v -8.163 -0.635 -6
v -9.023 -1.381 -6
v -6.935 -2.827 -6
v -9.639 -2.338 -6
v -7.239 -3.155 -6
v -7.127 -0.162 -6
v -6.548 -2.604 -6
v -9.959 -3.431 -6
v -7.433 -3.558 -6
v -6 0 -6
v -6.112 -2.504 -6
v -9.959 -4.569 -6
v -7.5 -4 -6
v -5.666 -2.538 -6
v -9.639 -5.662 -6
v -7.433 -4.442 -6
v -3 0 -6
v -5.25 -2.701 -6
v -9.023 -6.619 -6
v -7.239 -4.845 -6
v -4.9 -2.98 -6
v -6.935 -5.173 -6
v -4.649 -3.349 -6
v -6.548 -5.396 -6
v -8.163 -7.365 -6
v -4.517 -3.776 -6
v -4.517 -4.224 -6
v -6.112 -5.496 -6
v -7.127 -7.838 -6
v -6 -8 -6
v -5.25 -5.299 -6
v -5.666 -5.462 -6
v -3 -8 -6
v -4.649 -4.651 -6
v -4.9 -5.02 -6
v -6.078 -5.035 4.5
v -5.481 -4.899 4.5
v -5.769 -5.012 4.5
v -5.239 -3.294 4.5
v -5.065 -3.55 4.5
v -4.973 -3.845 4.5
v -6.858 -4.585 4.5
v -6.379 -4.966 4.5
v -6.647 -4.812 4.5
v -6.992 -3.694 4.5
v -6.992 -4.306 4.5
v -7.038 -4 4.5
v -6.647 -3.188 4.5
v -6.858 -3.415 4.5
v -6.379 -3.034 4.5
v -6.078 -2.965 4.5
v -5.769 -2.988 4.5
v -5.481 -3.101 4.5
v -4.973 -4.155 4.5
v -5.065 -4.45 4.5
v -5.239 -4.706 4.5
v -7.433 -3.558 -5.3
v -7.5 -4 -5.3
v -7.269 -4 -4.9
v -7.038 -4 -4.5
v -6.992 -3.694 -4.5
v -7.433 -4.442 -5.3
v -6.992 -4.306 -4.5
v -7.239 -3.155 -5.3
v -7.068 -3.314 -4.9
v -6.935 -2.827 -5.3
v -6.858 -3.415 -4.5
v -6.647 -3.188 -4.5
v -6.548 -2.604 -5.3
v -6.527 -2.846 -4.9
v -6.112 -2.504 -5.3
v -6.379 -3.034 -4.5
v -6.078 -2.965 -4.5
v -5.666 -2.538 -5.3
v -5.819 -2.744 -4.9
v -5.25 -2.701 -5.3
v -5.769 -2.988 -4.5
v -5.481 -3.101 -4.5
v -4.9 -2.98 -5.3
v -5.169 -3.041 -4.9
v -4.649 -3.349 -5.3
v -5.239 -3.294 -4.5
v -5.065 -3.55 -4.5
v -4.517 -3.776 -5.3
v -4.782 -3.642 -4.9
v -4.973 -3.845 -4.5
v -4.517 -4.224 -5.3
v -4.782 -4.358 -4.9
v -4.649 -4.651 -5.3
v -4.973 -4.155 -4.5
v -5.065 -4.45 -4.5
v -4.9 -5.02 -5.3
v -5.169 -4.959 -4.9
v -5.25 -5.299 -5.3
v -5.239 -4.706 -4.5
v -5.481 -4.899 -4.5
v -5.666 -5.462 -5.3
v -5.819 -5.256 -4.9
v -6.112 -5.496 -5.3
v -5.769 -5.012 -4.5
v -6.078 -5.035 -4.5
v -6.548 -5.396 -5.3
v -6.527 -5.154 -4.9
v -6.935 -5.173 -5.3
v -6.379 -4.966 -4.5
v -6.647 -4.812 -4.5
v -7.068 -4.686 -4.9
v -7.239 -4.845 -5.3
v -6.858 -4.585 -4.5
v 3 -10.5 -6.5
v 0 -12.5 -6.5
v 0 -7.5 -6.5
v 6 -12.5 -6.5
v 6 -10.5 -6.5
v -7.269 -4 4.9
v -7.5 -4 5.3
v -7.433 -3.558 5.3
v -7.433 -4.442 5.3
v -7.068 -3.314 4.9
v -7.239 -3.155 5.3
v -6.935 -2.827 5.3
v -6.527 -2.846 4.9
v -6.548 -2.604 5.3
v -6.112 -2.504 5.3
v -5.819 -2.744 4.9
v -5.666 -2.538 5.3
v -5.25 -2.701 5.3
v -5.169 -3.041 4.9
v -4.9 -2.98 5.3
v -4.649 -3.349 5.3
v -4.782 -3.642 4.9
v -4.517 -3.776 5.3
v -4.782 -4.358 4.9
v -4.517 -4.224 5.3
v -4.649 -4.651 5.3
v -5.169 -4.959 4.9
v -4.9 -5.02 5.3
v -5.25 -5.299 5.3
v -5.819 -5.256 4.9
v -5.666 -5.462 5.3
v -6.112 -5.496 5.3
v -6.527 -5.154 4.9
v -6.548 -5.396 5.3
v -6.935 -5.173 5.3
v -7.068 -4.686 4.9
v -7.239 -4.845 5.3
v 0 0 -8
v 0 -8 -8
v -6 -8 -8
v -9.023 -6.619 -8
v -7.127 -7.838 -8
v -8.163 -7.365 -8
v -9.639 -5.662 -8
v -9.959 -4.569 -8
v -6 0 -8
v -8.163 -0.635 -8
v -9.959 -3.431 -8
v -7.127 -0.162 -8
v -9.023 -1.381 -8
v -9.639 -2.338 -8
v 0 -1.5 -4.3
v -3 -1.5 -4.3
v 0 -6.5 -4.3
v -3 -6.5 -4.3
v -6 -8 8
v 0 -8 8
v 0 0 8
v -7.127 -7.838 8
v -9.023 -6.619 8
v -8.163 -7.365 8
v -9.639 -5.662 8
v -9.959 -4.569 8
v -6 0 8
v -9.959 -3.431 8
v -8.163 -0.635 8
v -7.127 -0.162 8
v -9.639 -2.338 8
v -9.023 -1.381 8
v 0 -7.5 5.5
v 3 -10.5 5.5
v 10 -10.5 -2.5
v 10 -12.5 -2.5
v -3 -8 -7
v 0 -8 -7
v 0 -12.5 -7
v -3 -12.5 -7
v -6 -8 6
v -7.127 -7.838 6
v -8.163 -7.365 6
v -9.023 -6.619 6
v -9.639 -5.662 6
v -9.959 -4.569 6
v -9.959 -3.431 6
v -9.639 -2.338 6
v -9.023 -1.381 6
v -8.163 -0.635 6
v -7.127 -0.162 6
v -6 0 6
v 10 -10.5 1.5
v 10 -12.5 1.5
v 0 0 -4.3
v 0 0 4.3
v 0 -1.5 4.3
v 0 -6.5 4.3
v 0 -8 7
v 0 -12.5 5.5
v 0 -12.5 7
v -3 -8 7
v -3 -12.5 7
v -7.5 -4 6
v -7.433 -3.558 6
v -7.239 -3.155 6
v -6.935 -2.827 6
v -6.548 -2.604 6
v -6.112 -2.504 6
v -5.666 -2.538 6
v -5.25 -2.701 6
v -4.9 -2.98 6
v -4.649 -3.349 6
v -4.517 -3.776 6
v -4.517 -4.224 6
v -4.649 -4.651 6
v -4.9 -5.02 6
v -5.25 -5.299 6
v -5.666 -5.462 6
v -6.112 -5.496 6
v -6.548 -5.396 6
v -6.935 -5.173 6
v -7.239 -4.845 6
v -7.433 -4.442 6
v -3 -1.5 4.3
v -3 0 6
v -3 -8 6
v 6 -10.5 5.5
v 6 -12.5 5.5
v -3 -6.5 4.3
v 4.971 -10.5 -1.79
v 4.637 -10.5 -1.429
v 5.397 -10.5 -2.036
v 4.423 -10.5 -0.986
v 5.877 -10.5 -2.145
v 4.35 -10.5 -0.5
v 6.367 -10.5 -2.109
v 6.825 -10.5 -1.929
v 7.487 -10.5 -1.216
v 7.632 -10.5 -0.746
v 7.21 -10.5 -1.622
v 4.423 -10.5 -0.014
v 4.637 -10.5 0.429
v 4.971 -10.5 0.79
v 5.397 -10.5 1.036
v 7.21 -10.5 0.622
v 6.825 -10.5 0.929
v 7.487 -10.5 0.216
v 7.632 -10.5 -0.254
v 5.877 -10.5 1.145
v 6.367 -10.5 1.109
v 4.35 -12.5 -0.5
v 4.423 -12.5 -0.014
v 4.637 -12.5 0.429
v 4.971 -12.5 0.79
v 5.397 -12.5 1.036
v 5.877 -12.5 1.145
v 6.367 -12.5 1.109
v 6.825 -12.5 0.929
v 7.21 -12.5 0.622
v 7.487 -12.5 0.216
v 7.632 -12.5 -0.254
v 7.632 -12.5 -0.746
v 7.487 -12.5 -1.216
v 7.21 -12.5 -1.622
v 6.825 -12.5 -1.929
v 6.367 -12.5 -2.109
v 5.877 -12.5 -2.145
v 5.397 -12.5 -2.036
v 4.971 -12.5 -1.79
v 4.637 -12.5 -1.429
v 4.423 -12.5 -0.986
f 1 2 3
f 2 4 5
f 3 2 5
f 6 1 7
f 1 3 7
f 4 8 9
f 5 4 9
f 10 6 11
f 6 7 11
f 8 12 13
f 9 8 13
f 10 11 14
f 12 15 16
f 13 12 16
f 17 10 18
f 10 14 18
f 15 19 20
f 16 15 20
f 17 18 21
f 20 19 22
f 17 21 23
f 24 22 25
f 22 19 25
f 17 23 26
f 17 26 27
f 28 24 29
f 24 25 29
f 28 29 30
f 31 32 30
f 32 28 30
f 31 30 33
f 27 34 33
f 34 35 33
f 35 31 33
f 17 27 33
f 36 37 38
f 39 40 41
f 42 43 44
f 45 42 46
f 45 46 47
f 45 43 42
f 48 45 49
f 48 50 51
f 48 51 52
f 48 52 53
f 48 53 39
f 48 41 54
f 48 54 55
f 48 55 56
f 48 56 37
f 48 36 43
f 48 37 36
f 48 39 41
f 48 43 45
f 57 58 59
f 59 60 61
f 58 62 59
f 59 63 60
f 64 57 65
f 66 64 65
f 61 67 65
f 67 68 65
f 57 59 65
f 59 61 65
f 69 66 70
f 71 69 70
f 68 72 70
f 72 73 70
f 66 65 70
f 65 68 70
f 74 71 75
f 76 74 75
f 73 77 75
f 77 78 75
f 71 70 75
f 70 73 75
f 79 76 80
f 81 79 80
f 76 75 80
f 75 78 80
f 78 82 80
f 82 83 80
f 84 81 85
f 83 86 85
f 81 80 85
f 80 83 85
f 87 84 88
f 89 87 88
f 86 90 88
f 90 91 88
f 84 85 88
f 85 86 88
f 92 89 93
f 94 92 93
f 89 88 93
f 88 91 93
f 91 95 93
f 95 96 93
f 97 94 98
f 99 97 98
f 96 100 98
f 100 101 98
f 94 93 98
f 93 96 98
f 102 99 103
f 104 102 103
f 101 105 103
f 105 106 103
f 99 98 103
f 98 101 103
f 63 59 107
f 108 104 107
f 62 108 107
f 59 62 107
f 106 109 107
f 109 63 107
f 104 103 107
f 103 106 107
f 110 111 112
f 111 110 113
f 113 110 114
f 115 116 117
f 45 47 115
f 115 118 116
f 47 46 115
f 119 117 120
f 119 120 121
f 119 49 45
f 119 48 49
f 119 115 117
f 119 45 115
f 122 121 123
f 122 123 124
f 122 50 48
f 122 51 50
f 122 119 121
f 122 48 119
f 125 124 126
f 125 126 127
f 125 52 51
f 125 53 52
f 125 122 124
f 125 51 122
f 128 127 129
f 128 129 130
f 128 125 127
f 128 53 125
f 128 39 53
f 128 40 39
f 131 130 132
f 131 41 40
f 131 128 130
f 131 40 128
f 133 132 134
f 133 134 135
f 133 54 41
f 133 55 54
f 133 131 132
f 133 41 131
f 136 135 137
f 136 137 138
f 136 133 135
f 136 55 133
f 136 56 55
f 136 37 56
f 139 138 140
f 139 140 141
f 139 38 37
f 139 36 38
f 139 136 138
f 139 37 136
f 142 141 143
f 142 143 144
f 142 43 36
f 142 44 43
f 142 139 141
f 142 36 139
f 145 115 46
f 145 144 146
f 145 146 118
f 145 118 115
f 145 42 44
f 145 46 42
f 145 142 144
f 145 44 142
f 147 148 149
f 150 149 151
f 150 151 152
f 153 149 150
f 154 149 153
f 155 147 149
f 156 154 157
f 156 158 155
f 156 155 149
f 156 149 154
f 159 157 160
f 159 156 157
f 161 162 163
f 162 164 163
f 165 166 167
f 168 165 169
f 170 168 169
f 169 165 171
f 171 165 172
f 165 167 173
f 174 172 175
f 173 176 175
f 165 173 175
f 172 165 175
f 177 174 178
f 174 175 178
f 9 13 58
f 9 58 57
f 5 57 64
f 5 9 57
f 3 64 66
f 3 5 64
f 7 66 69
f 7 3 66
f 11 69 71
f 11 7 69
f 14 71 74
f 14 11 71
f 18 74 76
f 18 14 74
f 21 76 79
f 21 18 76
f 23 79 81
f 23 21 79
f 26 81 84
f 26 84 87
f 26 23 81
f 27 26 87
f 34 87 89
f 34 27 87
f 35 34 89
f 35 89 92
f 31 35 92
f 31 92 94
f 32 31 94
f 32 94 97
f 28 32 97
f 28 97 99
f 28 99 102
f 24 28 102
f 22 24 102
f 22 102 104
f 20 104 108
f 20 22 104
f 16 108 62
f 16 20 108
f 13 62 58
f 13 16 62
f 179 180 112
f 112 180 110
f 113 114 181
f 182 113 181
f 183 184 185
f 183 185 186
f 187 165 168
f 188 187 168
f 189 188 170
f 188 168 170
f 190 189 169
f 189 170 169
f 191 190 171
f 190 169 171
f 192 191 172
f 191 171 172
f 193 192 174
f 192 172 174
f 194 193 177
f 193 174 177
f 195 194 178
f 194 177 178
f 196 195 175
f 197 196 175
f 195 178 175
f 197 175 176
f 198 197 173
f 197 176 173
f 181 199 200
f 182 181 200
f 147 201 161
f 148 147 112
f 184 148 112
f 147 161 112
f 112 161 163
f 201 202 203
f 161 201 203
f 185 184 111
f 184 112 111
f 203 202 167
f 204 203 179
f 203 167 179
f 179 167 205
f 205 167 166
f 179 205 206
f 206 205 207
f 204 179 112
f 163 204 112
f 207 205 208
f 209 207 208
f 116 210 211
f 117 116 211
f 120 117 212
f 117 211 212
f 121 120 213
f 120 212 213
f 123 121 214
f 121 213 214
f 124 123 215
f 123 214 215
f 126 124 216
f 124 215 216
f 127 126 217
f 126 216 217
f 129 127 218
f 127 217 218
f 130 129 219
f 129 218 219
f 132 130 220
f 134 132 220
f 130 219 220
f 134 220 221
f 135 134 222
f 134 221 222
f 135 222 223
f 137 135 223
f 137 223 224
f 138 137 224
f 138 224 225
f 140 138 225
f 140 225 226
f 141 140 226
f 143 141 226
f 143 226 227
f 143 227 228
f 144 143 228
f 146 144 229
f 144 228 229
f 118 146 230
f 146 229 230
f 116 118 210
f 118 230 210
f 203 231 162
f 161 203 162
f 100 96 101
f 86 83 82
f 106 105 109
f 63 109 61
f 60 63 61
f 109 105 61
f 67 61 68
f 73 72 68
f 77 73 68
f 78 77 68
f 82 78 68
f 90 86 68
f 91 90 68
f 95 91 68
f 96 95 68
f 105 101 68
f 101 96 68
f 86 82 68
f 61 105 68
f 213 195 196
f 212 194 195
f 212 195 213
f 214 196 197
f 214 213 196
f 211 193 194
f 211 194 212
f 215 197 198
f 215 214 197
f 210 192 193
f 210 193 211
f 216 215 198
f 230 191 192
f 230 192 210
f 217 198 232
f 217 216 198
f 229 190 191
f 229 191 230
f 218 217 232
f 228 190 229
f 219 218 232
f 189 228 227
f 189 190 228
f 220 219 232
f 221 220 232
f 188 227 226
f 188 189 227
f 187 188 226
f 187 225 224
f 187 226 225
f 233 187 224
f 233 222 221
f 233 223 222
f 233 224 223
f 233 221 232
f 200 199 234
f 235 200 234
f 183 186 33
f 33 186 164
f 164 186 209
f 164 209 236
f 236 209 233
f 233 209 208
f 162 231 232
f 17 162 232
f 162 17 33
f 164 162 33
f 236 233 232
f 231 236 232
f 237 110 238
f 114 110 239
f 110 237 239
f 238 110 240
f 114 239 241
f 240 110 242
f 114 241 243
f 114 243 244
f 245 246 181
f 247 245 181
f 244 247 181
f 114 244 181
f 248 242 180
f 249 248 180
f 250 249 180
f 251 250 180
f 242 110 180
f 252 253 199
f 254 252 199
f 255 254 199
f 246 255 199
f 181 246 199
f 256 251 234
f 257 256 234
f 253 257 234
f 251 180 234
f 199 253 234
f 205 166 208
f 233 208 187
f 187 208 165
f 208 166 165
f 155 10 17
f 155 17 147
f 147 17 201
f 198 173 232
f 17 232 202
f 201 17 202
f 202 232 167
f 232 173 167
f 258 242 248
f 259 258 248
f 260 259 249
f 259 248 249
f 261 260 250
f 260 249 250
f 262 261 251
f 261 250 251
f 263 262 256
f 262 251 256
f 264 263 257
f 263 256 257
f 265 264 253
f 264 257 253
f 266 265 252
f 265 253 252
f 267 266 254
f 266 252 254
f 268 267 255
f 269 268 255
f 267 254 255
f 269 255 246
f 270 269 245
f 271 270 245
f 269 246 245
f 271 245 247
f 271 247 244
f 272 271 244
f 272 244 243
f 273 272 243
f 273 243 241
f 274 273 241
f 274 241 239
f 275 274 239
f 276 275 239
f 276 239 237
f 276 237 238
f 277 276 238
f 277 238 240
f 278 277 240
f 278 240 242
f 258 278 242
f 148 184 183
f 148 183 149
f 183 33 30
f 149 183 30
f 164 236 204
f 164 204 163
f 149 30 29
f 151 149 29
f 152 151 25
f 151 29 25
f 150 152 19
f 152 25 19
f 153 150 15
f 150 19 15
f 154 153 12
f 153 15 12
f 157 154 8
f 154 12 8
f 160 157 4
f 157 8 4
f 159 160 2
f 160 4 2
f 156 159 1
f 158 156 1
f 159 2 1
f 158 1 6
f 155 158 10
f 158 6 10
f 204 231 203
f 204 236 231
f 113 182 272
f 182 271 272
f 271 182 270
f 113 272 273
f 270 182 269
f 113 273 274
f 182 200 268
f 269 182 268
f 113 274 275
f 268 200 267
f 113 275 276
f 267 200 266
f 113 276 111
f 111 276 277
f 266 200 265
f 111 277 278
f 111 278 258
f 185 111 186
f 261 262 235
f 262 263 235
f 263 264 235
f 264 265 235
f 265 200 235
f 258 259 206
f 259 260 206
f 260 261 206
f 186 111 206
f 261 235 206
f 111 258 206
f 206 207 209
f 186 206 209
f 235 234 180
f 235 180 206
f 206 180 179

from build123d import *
from OCP.BRepFilletAPI import BRepFilletAPI_MakeChamfer

# Parameters (mm, degrees)
RESSALTO_EXTRUS_O1_DEPTH    = 8
CORTE_EXTRUS_O1_START       = -8
CORTE_EXTRUS_O1_OUTLINE_W   = 7
CORTE_EXTRUS_O1_OUTLINE_H   = 12
CORTE_EXTRUS_O1_OUTLINE_W_2 = 6
CORTE_EXTRUS_O1_OUTLINE_H_2 = 8.6
CORTE_EXTRUS_O1_DEPTH       = 8
CORTE_EXTRUS_O2_DEPTH       = 16.099668871
CORTE_EXTRUS_O2_DEPTH_BACK  = 16.099668871
ESBO_O3_W                   = 8.6
ESBO_O3_H                   = 5
CORTE_EXTRUS_O3_DEPTH       = 18.756407294
CORTE_EXTRUS_O3_DEPTH_BACK  = 18.756407294
ESBO_O4_R                   = 1.65
ESBO_O5_R                   = 1.5
RESSALTO_EXTRUS_O2_DEPTH    = 1.5
FILETE1_R                   = 2
CHANFRO1_SIZE               = 0.8
CHANFRO1_SIZE2              = 0.461880215
ESBO_O7_W                   = 9.300626083
ESBO_O7_H                   = 16
CORTE_EXTRUS_O5_DEPTH       = 10
RESSALTO_EXTRUS_O4_DEPTH    = 7
ESBO_O10_R                  = 1.65
CORTE_EXTRUS_O6_DEPTH       = 18.895530168
CHANFRO2_SIZE               = 3


# Read off the part's stored shape, not the designer's step: Corte-extrusão1
with BuildPart() as part:
    # Esboço1 → Ressalto-extrusão1 (new, symmetric)
    with BuildSketch(Plane.XY):
        with BuildLine():
            Line((-6, 0), (6, 0))
            Line((6, 0), (6, -5.690598923))
            Line((6, -5.690598923), (2, -8))
            Line((2, -8), (-6, -8))
            ThreePointArc((-6, -8), (-10, -4), (-6, 0))
        make_face()
    extrude(amount=RESSALTO_EXTRUS_O1_DEPTH, both=True)

    # Corte-extrusão1 outline → Corte-extrusão1 (cut)
    with BuildSketch(Plane(origin=(0, 0, 0), x_dir=(1, 0, 0), z_dir=(0, 1, 0)).offset(CORTE_EXTRUS_O1_START)):
        with Locations((-6.5, 0)):
            Rectangle(CORTE_EXTRUS_O1_OUTLINE_W, CORTE_EXTRUS_O1_OUTLINE_H)
        with Locations((3, 0)):
            Rectangle(CORTE_EXTRUS_O1_OUTLINE_W_2, CORTE_EXTRUS_O1_OUTLINE_H_2)
    extrude(amount=CORTE_EXTRUS_O1_DEPTH, mode=Mode.SUBTRACT)

    # Esboço3 → Corte-extrusão2 (cut, two sides: drawn at the far end of the back side and taken through both)
    with BuildSketch(Plane(origin=(0, 0, 0), x_dir=(0, 0, -1), z_dir=(1, 0, 0)).offset(-CORTE_EXTRUS_O2_DEPTH_BACK)):
        with Locations((0, -4)):
            Rectangle(ESBO_O3_W, ESBO_O3_H)
    extrude(amount=CORTE_EXTRUS_O2_DEPTH + CORTE_EXTRUS_O2_DEPTH_BACK, mode=Mode.SUBTRACT)

    # Esboço4 → Corte-extrusão3 (cut, two sides: drawn at the far end of the back side and taken through both)
    with BuildSketch(Plane(origin=(0, 0, 4.3), x_dir=(-1, 0, 0), z_dir=(0, 0, -1)).offset(-CORTE_EXTRUS_O3_DEPTH_BACK)):
        with Locations((-3.2, -4)):
            Circle(ESBO_O4_R)
    extrude(amount=CORTE_EXTRUS_O3_DEPTH + CORTE_EXTRUS_O3_DEPTH_BACK, mode=Mode.SUBTRACT)

    # Esboço5 → Ressalto-extrusão2 (add)
    with BuildSketch(Plane(origin=(0, 0, 6), x_dir=(-1, 0, 0), z_dir=(0, 0, -1))):
        with Locations((6, -4)):
            Circle(ESBO_O5_R)
    ressalto_extrus_o2 = extrude(amount=RESSALTO_EXTRUS_O2_DEPTH)

    # Espelhar1: Ressalto-extrusão2 across plane
    add(ressalto_extrus_o2.mirror(Plane.XY))

    # Filete1
    filete1_edges = [part.edges().sort_by_distance(p)[0] for p in [
        (6, -5.690598923, -6.15),
        (6, -5.690598923, 6.15),
    ]]
    fillet(filete1_edges, radius=FILETE1_R)

    # Chanfro1: one chamfer whose edges measure the first distance from different faces: ONE call of the kernel's chamfer builder (chamfer() names one face for all edges)
    chanfro1_edges_1 = [part.edges().sort_by_distance(p)[0] for p in [
        (-4.5, -4, 4.5),
    ]]
    chanfro1_side_1 = [part.faces().sort_by_distance(p)[0] for p in [
        (-4.5, -4, 5.25),
    ]]
    chanfro1_edges_2 = [part.edges().sort_by_distance(p)[0] for p in [
        (-4.5, -4, -4.5),
    ]]
    chanfro1_side_2 = [part.faces().sort_by_distance(p)[0] for p in [
        (-4.5, -4, -5.25),
    ]]
    chanfro1_edges_3 = [part.edges().sort_by_distance(p)[0] for p in [
        (4.85, -4, -4.3),
    ]]
    chanfro1_side_3 = [part.faces().sort_by_distance(p)[0] for p in [
        (4.85, -4, -6.15),
    ]]
    chanfro1_edges_4 = [part.edges().sort_by_distance(p)[0] for p in [
        (4.85, -4, 4.3),
    ]]
    chanfro1_side_4 = [part.faces().sort_by_distance(p)[0] for p in [
        (4.85, -4, 6.15),
    ]]
    chanfro1 = BRepFilletAPI_MakeChamfer(part.part.solid().wrapped)
    for e in chanfro1_edges_1:
        chanfro1.Add(CHANFRO1_SIZE, CHANFRO1_SIZE2, e.wrapped, chanfro1_side_1[0].wrapped)  # the first distance lies on this face
    for e in chanfro1_edges_2:
        chanfro1.Add(CHANFRO1_SIZE, CHANFRO1_SIZE2, e.wrapped, chanfro1_side_2[0].wrapped)  # the first distance lies on this face
    for e in chanfro1_edges_3:
        chanfro1.Add(CHANFRO1_SIZE, CHANFRO1_SIZE2, e.wrapped, chanfro1_side_3[0].wrapped)  # the first distance lies on this face
    for e in chanfro1_edges_4:
        chanfro1.Add(CHANFRO1_SIZE, CHANFRO1_SIZE2, e.wrapped, chanfro1_side_4[0].wrapped)  # the first distance lies on this face
    add(Compound.cast(chanfro1.Shape()), mode=Mode.REPLACE)

    # Esboço7 → Corte-extrusão5 (cut)
    with BuildSketch(Plane(origin=(0, 0, 0), x_dir=(1, 0, 0), z_dir=(0, 1, 0))):
        with Locations((4.650313042, 0)):
            Rectangle(ESBO_O7_W, ESBO_O7_H)
    extrude(amount=-CORTE_EXTRUS_O5_DEPTH, mode=Mode.SUBTRACT)

    # Esboço9 → Ressalto-extrusão4 (add, symmetric)
    with BuildSketch(Plane.XY):
        Polygon((0, -8), (0, -10.5), (10, -10.5), (10, -12.5), (-3, -12.5), (-3, -8), align=None)
    extrude(amount=RESSALTO_EXTRUS_O4_DEPTH, both=True)

    # Esboço10 → Corte-extrusão6 (cut, through all)
    with BuildSketch(Plane(origin=(0, 0, 0), x_dir=(1, 0, 0), z_dir=(0, 1, 0))):
        with Locations(Location((6, 0.5, 0), (0, 0, 180))):
            Circle(ESBO_O10_R)
        Polygon((6, 6.5), (10, 2.5), (10, 8), (5.06809326, 8), (0, 8), (0, 6.5), align=None)
        Polygon((10, -1.5), (6, -5.5), (0, -5.5), (0, -8), (10, -8), align=None)
    extrude(amount=-CORTE_EXTRUS_O6_DEPTH, mode=Mode.SUBTRACT)

    # Chanfro2
    chanfro2_edges = [part.edges().sort_by_distance(p)[0] for p in [
        (0, -10.5, -0.5),
    ]]
    chamfer(chanfro2_edges, length=CHANFRO2_SIZE)


solid = part.part
